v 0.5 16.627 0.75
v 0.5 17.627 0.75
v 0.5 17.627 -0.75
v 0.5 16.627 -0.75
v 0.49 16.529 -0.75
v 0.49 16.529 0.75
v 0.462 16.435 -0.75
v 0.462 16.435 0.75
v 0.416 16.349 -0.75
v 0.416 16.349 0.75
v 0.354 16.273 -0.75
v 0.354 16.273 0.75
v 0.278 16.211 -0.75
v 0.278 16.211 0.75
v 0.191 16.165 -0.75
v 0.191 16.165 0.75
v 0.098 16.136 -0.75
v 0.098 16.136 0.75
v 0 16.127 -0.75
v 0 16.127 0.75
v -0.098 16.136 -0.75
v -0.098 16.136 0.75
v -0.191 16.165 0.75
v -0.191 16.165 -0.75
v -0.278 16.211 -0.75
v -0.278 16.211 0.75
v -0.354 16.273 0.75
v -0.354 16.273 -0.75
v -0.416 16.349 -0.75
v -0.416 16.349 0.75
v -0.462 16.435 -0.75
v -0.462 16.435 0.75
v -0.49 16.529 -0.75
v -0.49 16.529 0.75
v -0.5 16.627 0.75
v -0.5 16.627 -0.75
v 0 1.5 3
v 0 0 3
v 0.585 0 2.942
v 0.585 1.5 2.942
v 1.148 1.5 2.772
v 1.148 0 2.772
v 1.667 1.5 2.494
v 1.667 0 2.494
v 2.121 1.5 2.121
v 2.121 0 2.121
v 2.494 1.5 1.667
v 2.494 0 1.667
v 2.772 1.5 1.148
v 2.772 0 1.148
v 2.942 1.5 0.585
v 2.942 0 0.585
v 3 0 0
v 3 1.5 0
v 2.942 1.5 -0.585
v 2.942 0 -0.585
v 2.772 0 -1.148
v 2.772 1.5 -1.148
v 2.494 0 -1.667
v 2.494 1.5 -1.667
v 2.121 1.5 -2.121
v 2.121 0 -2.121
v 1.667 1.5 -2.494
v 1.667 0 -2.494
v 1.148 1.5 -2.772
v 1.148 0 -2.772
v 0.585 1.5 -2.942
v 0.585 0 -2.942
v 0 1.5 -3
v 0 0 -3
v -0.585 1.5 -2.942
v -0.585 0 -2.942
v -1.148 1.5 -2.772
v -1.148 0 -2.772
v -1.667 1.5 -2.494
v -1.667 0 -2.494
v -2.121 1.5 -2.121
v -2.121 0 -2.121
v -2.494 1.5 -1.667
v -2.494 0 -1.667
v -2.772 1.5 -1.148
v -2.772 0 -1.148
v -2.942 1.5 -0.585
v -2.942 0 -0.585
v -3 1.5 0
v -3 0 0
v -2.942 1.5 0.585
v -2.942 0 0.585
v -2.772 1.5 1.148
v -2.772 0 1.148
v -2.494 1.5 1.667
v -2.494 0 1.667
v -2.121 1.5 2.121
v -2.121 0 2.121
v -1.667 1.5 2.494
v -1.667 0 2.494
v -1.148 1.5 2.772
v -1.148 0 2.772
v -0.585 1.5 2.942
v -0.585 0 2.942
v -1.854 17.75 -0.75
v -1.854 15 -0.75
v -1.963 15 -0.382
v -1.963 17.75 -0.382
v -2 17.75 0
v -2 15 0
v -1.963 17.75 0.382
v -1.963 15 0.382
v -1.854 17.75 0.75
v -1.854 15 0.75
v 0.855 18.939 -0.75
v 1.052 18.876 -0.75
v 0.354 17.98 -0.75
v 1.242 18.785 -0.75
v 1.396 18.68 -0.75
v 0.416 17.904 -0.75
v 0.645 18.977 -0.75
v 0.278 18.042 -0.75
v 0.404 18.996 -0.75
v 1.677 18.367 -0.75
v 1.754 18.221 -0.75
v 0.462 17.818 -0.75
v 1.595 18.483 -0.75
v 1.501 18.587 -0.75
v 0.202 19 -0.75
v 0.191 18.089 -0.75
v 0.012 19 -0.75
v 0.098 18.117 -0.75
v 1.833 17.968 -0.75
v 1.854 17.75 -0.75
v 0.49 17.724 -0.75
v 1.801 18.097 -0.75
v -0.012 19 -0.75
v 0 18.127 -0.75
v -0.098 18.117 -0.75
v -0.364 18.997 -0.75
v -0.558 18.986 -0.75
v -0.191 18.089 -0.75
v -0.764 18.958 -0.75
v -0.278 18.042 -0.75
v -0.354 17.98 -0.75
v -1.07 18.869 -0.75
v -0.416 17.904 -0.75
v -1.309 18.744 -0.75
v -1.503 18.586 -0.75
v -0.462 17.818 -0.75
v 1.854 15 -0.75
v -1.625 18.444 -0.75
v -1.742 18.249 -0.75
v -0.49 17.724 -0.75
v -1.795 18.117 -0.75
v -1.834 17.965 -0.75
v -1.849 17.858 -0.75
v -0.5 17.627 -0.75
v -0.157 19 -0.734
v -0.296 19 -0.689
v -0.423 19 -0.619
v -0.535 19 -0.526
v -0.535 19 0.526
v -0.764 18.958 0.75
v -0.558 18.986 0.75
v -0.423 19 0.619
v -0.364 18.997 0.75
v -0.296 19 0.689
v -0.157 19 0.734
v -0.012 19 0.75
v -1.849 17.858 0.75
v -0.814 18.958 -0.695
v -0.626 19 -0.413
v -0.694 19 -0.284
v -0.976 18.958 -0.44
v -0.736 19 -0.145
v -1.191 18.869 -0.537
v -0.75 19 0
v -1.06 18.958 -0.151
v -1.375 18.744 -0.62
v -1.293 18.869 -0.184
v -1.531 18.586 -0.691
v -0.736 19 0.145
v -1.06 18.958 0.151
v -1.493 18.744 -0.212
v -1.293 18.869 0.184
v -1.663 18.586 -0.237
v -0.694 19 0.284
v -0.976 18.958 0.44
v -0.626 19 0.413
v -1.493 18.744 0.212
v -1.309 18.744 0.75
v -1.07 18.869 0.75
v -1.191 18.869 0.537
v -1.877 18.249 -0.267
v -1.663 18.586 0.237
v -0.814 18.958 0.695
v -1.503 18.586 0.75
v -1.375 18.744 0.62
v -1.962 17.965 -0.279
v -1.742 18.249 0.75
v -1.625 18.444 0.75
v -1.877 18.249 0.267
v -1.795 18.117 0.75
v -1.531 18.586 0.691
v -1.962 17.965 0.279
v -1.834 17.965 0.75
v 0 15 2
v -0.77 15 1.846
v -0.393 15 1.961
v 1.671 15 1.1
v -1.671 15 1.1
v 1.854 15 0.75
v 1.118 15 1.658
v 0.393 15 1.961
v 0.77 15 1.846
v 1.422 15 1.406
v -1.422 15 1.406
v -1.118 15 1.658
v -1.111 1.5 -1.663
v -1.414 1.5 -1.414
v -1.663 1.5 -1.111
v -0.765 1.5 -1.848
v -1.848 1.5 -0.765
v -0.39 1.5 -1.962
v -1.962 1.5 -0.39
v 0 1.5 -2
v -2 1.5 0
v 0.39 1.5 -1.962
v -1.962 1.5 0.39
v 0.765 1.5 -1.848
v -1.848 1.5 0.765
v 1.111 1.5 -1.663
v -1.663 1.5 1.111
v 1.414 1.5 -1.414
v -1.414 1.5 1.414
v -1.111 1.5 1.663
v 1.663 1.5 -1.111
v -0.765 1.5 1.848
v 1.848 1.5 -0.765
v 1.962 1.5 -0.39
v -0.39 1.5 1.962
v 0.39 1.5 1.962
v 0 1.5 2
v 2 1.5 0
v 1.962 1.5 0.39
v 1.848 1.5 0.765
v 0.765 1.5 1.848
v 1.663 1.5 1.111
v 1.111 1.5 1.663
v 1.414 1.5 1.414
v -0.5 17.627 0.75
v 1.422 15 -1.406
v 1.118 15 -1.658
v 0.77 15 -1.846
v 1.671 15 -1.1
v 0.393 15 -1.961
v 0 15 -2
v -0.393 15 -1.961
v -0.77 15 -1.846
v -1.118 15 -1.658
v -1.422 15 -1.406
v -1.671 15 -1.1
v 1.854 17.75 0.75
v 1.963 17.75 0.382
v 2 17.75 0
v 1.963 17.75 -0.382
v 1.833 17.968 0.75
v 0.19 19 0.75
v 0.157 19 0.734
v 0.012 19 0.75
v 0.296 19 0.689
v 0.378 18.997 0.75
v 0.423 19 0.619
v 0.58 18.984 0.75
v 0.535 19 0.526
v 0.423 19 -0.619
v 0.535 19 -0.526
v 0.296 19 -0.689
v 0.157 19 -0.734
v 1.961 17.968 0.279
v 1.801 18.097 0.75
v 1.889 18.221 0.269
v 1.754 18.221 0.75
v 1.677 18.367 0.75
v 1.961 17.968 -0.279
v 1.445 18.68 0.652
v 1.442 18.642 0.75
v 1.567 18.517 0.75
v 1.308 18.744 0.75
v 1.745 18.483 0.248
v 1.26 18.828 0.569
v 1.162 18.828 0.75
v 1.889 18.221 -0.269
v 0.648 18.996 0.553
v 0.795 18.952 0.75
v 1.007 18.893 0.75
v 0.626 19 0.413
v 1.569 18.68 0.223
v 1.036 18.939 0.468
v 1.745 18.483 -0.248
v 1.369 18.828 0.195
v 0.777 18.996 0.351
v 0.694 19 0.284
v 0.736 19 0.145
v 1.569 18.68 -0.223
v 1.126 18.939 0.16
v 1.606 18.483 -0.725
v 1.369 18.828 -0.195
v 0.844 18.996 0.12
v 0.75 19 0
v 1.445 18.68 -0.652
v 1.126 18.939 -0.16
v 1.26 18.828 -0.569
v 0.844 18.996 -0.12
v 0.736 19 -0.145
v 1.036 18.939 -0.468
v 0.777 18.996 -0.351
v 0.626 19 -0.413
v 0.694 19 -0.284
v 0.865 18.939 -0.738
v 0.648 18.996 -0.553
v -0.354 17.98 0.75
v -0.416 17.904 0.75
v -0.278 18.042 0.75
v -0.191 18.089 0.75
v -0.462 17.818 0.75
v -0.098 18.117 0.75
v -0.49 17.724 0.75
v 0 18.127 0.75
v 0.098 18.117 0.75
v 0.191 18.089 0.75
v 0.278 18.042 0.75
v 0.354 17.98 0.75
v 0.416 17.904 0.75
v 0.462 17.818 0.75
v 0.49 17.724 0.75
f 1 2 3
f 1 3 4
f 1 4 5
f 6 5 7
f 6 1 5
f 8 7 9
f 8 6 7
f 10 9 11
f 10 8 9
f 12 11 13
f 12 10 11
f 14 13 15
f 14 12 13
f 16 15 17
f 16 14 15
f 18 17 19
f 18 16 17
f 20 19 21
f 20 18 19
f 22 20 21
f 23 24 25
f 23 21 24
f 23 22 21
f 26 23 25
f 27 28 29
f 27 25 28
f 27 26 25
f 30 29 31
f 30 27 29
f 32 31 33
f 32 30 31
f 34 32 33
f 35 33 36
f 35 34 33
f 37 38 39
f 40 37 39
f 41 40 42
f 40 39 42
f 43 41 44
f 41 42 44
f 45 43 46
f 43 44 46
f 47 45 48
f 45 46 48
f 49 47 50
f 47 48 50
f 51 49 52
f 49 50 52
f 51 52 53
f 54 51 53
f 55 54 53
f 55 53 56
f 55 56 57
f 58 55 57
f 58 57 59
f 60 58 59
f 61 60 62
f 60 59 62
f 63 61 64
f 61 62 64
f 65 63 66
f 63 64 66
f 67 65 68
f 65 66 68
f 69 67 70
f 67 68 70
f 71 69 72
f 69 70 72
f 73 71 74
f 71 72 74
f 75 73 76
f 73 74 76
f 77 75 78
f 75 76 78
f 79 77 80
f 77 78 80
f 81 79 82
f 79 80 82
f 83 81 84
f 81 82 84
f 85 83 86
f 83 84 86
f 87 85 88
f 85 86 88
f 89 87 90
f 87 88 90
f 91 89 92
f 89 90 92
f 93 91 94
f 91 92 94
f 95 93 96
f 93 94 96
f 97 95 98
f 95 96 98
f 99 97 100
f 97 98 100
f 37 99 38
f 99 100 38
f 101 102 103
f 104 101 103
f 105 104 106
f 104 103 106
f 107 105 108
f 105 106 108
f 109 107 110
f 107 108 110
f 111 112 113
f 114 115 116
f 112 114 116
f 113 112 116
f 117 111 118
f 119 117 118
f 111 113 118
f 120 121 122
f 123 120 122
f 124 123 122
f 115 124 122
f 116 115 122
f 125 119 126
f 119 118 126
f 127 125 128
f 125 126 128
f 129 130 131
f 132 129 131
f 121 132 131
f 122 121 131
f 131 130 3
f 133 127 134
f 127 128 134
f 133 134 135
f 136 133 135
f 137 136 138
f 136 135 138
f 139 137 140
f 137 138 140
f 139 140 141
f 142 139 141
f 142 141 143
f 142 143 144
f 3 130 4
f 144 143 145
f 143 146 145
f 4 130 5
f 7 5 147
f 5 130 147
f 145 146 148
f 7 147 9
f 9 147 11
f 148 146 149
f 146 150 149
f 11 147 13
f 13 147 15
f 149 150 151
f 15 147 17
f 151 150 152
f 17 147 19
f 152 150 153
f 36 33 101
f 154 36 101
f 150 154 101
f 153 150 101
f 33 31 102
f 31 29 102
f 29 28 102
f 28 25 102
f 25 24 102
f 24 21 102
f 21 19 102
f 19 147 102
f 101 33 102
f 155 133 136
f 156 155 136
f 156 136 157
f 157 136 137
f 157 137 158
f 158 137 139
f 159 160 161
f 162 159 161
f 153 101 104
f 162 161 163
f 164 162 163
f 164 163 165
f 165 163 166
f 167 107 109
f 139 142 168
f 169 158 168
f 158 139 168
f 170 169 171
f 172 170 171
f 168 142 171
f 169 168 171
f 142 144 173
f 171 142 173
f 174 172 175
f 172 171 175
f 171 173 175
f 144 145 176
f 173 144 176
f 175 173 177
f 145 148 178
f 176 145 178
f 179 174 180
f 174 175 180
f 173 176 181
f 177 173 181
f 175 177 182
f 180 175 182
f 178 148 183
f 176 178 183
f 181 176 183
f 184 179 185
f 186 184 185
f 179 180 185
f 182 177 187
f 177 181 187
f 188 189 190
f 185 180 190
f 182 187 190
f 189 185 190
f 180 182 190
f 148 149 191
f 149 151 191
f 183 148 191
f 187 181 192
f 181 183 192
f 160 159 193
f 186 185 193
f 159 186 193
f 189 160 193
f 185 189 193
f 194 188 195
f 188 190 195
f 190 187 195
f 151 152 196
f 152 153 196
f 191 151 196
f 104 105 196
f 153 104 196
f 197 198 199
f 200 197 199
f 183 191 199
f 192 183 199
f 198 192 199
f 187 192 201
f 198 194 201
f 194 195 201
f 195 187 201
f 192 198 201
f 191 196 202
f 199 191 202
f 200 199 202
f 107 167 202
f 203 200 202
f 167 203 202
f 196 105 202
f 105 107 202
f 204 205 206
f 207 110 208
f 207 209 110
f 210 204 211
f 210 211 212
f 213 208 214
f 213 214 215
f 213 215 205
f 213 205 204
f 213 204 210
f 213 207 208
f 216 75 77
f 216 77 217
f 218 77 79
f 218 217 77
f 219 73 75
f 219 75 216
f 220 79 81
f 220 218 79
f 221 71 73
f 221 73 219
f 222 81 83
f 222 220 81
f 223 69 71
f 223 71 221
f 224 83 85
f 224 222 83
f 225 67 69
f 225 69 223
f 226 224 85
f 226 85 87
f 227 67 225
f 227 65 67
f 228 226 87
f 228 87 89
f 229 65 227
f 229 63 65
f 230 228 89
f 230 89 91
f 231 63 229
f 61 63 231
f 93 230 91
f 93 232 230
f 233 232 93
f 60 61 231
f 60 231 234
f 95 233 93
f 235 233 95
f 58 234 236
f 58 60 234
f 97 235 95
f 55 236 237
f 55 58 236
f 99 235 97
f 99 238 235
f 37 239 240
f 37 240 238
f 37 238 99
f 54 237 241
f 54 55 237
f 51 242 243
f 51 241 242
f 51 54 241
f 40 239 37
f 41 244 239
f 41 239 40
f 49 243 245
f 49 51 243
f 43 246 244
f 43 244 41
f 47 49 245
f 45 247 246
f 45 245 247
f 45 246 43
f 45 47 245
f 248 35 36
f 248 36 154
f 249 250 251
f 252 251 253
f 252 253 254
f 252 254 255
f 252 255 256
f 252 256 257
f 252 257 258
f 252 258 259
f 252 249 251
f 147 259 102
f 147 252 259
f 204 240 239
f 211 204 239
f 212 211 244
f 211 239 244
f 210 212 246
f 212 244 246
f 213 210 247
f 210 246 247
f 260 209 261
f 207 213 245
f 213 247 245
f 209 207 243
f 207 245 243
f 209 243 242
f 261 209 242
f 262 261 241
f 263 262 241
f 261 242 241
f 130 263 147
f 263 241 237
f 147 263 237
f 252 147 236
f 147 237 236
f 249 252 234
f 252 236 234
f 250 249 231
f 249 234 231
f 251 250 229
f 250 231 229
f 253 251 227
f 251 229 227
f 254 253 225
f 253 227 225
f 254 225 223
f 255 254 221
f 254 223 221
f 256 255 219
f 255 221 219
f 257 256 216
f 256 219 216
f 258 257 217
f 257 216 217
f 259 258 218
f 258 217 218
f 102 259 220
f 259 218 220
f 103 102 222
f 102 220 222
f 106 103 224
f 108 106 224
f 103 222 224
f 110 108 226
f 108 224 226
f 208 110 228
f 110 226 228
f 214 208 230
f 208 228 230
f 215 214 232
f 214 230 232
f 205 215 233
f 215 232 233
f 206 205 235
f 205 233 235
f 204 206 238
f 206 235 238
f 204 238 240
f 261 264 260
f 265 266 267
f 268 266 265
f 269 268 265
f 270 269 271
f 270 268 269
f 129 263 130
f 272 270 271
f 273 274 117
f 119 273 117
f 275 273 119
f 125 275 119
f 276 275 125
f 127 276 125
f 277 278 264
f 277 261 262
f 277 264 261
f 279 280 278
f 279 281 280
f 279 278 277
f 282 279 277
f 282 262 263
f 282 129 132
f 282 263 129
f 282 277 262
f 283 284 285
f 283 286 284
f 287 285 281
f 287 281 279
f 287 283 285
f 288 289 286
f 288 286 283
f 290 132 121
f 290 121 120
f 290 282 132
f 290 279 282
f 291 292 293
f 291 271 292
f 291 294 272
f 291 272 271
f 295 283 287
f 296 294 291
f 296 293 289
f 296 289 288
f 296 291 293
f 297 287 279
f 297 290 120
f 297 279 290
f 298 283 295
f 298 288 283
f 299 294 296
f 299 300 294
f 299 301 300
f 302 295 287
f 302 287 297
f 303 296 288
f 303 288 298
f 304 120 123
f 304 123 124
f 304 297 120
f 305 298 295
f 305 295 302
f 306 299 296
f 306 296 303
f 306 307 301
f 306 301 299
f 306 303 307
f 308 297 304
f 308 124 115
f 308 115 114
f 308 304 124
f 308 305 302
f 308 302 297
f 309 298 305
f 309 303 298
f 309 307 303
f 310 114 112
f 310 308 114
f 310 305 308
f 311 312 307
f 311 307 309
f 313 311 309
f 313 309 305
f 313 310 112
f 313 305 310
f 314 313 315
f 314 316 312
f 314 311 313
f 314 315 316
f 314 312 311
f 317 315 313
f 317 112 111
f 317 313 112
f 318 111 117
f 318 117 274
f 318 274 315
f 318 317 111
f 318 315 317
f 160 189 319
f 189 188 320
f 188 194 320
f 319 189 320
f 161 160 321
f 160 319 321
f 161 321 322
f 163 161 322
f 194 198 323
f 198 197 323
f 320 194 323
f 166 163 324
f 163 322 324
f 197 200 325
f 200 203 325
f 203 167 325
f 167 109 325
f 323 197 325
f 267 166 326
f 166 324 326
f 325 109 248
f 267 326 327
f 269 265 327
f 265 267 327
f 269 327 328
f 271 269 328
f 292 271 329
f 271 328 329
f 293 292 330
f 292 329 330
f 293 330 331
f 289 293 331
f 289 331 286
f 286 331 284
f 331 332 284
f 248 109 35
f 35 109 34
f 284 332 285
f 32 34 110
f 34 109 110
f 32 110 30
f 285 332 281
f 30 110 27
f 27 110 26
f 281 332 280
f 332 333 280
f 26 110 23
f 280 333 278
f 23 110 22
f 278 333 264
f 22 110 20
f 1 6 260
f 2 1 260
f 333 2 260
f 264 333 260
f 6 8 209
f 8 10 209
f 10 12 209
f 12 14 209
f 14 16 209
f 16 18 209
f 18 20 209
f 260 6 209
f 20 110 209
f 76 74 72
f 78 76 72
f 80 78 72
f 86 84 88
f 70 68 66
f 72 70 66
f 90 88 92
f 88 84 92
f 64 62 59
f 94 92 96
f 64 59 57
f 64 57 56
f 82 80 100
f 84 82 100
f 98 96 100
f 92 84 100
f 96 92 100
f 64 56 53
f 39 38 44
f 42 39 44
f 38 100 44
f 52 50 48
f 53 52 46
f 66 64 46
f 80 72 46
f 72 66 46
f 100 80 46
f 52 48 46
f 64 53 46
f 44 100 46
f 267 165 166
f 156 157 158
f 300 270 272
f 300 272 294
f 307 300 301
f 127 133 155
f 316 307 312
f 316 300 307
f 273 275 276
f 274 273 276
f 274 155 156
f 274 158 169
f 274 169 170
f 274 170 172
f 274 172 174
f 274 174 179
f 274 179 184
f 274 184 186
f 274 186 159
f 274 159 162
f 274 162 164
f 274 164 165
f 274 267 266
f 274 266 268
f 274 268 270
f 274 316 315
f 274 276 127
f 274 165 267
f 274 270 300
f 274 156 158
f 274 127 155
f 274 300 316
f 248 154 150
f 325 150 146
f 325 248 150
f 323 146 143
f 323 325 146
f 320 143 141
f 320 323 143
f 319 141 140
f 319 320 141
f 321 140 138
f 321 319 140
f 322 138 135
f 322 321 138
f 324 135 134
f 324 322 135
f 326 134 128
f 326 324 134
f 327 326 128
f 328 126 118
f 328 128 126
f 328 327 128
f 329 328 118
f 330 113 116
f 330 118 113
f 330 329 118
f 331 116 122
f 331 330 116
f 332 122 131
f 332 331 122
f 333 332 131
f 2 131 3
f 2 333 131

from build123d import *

# Parameters (mm, degrees)
SKETCH1_R           = 3
BOSS_EXTRUDE1_DEPTH = 1.5
SKETCH2_R           = 2
BOSS_EXTRUDE2_DEPTH = 13.5
BOSS_EXTRUDE3_DEPTH = 4
CUT_EXTRUDE1_DEPTH  = 3
FILLET5_R           = 1.25


with BuildPart() as part:
    # Sketch1 → Boss-Extrude1 (new body)
    with BuildSketch(Plane(origin=(0, 0, 0), x_dir=(1, 0, 0), z_dir=(0, 1, 0))):
        with Locations(Location((0, 0, 0), (0, 0, 270))):
            Circle(SKETCH1_R)
    extrude(amount=BOSS_EXTRUDE1_DEPTH)

    # Sketch2 → Boss-Extrude2 (add)
    with BuildSketch(Plane(origin=(0, 1.5, 0), x_dir=(1, 0, 0), z_dir=(0, 1, 0))):
        with Locations(Location((0, 0, 0), (0, 0, 270))):
            Circle(SKETCH2_R)
    extrude(amount=BOSS_EXTRUDE2_DEPTH)

    # Sketch6 → Boss-Extrude3 (add)
    with BuildSketch(Plane(origin=(0, 15, 0), x_dir=(1, 0, 0), z_dir=(0, 1, 0))):
        with BuildLine():
            Line((1.854049622, 0.75), (-1.854049622, 0.75))
            ThreePointArc((-1.854049622, 0.75), (-2, 0), (-1.854049622, -0.75))
            Line((-1.854049622, -0.75), (1.854049622, -0.75))
            ThreePointArc((1.854049622, -0.75), (2, 0), (1.854049622, 0.75))
        make_face()
    extrude(amount=BOSS_EXTRUDE3_DEPTH)

    # Sketch7 → Cut-Extrude1 (cut)
    with BuildSketch(Plane.XY.offset(0.75)):
        with BuildLine():
            Line((-0.5, 16.62671351), (-0.5, 17.62671351))
            ThreePointArc((-0.5, 17.62671351), (0, 18.12671351), (0.5, 17.62671351))
            Line((0.5, 17.62671351), (0.5, 16.62671351))
            ThreePointArc((0.5, 16.62671351), (0, 16.12671351), (-0.5, 16.62671351))
        make_face()
    extrude(amount=-CUT_EXTRUDE1_DEPTH, mode=Mode.SUBTRACT)

    # Fillet5
    fillet5_edges = [part.edges().sort_by_distance(p)[0] for p in [
        (-2, 19, 0),
        (2, 19, 0),
    ]]
    fillet(fillet5_edges, radius=FILLET5_R - 0.0001)  # a hair under: the kernel refuses the full size


solid = part.part
